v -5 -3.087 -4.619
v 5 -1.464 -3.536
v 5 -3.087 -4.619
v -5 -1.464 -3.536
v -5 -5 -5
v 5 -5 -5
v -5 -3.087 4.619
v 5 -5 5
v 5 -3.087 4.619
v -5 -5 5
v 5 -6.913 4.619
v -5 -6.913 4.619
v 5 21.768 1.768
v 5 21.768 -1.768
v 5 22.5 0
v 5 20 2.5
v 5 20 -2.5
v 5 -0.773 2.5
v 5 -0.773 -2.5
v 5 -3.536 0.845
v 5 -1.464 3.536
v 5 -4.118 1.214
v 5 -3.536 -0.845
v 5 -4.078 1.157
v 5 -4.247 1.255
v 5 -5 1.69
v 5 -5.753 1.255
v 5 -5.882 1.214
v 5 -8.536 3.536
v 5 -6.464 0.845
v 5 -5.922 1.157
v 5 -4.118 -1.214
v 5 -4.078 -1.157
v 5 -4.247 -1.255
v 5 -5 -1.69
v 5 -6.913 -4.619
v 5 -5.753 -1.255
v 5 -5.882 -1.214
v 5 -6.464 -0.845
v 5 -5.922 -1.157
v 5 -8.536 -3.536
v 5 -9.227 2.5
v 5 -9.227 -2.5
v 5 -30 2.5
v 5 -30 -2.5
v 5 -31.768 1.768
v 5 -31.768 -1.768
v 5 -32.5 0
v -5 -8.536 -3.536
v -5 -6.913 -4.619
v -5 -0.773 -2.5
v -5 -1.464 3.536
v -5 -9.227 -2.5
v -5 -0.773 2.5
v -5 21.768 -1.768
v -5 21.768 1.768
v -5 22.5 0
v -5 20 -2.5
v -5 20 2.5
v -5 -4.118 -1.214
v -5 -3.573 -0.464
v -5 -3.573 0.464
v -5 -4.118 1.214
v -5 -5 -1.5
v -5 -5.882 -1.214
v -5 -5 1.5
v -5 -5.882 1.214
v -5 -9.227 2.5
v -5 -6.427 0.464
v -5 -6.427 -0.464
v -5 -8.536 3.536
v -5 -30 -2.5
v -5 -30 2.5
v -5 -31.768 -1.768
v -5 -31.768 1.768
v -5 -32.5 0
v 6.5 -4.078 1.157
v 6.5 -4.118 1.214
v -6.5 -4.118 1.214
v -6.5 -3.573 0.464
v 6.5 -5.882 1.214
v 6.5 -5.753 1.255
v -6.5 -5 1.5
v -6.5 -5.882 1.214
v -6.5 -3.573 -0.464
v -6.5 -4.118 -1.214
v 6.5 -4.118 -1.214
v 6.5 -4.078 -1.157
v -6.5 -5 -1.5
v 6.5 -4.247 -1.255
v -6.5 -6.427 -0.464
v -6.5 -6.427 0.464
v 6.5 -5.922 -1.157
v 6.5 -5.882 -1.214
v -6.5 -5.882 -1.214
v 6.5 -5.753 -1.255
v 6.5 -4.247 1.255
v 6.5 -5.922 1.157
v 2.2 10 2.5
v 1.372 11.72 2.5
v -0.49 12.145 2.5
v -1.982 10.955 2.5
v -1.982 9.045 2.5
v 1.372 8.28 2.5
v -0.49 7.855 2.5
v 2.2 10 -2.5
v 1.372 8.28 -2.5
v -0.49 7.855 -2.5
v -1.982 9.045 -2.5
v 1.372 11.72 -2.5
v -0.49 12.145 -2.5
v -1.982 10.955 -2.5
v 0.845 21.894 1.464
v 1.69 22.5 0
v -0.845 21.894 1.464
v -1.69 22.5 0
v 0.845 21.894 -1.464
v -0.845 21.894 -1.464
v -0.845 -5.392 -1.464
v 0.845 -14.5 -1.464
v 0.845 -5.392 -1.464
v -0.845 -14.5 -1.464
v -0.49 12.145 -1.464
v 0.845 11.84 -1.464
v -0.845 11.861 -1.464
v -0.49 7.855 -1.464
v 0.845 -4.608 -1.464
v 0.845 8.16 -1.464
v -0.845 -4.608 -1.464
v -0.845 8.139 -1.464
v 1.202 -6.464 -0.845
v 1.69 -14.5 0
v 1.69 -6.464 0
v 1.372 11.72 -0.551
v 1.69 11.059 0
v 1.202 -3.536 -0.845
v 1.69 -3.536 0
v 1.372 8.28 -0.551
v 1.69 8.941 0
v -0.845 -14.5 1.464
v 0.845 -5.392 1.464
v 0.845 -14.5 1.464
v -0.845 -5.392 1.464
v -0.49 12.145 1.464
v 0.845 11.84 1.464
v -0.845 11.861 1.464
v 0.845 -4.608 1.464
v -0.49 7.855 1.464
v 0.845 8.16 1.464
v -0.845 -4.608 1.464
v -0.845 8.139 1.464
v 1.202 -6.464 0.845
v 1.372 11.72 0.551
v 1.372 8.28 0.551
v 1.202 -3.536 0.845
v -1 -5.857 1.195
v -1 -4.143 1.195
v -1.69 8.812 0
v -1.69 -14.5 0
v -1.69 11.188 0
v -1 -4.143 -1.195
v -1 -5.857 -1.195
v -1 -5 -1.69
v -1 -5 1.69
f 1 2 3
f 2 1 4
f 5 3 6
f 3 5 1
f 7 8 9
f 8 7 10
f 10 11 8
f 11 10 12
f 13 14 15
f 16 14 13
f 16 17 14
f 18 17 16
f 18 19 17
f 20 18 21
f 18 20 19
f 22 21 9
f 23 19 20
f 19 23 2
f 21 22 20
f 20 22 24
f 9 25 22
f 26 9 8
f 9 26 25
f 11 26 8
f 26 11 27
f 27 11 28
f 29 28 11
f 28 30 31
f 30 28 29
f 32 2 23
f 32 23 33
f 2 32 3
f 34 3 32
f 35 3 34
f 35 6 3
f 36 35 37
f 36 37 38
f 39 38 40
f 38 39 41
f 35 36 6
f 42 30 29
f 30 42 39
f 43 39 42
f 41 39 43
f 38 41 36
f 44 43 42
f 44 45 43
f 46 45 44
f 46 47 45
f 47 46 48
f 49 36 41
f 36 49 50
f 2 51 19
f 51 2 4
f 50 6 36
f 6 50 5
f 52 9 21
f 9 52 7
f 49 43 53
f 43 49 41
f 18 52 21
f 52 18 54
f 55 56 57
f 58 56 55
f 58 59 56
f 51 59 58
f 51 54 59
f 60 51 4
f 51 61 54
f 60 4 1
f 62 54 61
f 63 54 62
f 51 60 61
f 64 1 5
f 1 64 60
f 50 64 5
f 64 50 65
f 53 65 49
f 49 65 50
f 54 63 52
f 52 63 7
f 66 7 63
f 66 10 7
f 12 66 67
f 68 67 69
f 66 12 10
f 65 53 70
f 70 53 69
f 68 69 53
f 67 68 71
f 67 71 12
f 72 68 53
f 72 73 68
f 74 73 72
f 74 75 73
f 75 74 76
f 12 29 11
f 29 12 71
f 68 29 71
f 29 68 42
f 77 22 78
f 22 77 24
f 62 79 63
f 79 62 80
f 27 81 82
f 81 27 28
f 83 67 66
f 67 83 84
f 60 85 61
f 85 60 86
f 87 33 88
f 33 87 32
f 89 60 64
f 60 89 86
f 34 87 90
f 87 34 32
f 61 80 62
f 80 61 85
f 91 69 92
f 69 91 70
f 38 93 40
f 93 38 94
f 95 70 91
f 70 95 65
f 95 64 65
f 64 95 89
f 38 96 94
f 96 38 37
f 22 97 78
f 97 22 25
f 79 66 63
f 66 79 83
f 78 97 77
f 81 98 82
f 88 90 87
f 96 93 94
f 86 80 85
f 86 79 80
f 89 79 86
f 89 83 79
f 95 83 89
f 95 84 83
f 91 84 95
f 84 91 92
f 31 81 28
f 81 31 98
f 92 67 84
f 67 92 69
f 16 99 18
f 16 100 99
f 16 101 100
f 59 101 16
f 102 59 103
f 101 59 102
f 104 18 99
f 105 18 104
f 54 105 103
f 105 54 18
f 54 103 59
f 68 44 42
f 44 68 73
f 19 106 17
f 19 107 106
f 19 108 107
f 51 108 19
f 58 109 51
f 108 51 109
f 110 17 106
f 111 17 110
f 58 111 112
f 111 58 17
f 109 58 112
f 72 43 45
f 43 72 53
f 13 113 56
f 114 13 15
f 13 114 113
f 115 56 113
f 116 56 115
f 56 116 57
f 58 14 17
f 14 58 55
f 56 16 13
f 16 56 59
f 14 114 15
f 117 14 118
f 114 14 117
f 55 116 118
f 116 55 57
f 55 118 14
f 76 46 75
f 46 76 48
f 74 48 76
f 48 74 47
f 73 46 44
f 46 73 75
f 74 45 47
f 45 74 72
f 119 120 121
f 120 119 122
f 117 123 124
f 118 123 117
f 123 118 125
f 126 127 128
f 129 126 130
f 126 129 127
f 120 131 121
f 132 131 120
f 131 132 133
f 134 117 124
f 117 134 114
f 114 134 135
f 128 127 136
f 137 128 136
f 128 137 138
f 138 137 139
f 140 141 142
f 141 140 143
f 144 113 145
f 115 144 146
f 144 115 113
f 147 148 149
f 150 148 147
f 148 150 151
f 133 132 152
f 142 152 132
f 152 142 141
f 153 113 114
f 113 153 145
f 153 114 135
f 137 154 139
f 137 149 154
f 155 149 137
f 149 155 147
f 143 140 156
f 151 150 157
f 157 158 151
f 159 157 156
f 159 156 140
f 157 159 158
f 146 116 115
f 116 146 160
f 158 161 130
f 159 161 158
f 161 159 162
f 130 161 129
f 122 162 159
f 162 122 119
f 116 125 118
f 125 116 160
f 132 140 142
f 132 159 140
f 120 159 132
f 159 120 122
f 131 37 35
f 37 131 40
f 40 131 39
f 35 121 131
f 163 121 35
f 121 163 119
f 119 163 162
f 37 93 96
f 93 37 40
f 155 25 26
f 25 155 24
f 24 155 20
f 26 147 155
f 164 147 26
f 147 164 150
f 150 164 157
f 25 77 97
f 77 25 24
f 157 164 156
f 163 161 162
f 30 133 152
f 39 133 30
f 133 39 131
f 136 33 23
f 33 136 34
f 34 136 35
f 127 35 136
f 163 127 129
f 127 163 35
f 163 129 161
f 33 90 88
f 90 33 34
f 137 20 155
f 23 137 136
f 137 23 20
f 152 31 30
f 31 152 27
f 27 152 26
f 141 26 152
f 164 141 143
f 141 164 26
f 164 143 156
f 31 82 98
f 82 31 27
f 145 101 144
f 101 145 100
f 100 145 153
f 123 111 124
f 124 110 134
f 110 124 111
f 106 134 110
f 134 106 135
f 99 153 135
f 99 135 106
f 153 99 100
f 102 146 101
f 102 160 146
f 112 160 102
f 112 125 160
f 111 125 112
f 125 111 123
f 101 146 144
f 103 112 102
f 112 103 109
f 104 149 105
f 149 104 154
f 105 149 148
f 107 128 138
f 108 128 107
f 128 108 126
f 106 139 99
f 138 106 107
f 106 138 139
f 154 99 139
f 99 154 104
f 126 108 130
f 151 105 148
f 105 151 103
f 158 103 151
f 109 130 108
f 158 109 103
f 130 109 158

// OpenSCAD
difference(){
union(){
translate([0,-5,0]) cube([10,50,5],center=true);
translate([0,-5,0]) rotate([0,90,0]){
	cylinder(r=5,h=10,center=true);
	cylinder(r=1.5,h=13,center=true,$fn=10);
}
translate([0,20,0]) rotate([0,90,0]) cylinder(r=2.5,h=10,center=true);
translate([0,-30,0]) rotate([0,90,0]) cylinder(r=2.5,h=10,center=true);

}
translate([0,8,0]) rotate([90,0,0]) cylinder(r=1.69,h=45,center=true);
translate([3,-5,0]) rotate([0,90,0]) cylinder(r=1.69,h=8,center=true);
translate([0,10,0]) cylinder(r=2.2,h=8,center=true);

}
